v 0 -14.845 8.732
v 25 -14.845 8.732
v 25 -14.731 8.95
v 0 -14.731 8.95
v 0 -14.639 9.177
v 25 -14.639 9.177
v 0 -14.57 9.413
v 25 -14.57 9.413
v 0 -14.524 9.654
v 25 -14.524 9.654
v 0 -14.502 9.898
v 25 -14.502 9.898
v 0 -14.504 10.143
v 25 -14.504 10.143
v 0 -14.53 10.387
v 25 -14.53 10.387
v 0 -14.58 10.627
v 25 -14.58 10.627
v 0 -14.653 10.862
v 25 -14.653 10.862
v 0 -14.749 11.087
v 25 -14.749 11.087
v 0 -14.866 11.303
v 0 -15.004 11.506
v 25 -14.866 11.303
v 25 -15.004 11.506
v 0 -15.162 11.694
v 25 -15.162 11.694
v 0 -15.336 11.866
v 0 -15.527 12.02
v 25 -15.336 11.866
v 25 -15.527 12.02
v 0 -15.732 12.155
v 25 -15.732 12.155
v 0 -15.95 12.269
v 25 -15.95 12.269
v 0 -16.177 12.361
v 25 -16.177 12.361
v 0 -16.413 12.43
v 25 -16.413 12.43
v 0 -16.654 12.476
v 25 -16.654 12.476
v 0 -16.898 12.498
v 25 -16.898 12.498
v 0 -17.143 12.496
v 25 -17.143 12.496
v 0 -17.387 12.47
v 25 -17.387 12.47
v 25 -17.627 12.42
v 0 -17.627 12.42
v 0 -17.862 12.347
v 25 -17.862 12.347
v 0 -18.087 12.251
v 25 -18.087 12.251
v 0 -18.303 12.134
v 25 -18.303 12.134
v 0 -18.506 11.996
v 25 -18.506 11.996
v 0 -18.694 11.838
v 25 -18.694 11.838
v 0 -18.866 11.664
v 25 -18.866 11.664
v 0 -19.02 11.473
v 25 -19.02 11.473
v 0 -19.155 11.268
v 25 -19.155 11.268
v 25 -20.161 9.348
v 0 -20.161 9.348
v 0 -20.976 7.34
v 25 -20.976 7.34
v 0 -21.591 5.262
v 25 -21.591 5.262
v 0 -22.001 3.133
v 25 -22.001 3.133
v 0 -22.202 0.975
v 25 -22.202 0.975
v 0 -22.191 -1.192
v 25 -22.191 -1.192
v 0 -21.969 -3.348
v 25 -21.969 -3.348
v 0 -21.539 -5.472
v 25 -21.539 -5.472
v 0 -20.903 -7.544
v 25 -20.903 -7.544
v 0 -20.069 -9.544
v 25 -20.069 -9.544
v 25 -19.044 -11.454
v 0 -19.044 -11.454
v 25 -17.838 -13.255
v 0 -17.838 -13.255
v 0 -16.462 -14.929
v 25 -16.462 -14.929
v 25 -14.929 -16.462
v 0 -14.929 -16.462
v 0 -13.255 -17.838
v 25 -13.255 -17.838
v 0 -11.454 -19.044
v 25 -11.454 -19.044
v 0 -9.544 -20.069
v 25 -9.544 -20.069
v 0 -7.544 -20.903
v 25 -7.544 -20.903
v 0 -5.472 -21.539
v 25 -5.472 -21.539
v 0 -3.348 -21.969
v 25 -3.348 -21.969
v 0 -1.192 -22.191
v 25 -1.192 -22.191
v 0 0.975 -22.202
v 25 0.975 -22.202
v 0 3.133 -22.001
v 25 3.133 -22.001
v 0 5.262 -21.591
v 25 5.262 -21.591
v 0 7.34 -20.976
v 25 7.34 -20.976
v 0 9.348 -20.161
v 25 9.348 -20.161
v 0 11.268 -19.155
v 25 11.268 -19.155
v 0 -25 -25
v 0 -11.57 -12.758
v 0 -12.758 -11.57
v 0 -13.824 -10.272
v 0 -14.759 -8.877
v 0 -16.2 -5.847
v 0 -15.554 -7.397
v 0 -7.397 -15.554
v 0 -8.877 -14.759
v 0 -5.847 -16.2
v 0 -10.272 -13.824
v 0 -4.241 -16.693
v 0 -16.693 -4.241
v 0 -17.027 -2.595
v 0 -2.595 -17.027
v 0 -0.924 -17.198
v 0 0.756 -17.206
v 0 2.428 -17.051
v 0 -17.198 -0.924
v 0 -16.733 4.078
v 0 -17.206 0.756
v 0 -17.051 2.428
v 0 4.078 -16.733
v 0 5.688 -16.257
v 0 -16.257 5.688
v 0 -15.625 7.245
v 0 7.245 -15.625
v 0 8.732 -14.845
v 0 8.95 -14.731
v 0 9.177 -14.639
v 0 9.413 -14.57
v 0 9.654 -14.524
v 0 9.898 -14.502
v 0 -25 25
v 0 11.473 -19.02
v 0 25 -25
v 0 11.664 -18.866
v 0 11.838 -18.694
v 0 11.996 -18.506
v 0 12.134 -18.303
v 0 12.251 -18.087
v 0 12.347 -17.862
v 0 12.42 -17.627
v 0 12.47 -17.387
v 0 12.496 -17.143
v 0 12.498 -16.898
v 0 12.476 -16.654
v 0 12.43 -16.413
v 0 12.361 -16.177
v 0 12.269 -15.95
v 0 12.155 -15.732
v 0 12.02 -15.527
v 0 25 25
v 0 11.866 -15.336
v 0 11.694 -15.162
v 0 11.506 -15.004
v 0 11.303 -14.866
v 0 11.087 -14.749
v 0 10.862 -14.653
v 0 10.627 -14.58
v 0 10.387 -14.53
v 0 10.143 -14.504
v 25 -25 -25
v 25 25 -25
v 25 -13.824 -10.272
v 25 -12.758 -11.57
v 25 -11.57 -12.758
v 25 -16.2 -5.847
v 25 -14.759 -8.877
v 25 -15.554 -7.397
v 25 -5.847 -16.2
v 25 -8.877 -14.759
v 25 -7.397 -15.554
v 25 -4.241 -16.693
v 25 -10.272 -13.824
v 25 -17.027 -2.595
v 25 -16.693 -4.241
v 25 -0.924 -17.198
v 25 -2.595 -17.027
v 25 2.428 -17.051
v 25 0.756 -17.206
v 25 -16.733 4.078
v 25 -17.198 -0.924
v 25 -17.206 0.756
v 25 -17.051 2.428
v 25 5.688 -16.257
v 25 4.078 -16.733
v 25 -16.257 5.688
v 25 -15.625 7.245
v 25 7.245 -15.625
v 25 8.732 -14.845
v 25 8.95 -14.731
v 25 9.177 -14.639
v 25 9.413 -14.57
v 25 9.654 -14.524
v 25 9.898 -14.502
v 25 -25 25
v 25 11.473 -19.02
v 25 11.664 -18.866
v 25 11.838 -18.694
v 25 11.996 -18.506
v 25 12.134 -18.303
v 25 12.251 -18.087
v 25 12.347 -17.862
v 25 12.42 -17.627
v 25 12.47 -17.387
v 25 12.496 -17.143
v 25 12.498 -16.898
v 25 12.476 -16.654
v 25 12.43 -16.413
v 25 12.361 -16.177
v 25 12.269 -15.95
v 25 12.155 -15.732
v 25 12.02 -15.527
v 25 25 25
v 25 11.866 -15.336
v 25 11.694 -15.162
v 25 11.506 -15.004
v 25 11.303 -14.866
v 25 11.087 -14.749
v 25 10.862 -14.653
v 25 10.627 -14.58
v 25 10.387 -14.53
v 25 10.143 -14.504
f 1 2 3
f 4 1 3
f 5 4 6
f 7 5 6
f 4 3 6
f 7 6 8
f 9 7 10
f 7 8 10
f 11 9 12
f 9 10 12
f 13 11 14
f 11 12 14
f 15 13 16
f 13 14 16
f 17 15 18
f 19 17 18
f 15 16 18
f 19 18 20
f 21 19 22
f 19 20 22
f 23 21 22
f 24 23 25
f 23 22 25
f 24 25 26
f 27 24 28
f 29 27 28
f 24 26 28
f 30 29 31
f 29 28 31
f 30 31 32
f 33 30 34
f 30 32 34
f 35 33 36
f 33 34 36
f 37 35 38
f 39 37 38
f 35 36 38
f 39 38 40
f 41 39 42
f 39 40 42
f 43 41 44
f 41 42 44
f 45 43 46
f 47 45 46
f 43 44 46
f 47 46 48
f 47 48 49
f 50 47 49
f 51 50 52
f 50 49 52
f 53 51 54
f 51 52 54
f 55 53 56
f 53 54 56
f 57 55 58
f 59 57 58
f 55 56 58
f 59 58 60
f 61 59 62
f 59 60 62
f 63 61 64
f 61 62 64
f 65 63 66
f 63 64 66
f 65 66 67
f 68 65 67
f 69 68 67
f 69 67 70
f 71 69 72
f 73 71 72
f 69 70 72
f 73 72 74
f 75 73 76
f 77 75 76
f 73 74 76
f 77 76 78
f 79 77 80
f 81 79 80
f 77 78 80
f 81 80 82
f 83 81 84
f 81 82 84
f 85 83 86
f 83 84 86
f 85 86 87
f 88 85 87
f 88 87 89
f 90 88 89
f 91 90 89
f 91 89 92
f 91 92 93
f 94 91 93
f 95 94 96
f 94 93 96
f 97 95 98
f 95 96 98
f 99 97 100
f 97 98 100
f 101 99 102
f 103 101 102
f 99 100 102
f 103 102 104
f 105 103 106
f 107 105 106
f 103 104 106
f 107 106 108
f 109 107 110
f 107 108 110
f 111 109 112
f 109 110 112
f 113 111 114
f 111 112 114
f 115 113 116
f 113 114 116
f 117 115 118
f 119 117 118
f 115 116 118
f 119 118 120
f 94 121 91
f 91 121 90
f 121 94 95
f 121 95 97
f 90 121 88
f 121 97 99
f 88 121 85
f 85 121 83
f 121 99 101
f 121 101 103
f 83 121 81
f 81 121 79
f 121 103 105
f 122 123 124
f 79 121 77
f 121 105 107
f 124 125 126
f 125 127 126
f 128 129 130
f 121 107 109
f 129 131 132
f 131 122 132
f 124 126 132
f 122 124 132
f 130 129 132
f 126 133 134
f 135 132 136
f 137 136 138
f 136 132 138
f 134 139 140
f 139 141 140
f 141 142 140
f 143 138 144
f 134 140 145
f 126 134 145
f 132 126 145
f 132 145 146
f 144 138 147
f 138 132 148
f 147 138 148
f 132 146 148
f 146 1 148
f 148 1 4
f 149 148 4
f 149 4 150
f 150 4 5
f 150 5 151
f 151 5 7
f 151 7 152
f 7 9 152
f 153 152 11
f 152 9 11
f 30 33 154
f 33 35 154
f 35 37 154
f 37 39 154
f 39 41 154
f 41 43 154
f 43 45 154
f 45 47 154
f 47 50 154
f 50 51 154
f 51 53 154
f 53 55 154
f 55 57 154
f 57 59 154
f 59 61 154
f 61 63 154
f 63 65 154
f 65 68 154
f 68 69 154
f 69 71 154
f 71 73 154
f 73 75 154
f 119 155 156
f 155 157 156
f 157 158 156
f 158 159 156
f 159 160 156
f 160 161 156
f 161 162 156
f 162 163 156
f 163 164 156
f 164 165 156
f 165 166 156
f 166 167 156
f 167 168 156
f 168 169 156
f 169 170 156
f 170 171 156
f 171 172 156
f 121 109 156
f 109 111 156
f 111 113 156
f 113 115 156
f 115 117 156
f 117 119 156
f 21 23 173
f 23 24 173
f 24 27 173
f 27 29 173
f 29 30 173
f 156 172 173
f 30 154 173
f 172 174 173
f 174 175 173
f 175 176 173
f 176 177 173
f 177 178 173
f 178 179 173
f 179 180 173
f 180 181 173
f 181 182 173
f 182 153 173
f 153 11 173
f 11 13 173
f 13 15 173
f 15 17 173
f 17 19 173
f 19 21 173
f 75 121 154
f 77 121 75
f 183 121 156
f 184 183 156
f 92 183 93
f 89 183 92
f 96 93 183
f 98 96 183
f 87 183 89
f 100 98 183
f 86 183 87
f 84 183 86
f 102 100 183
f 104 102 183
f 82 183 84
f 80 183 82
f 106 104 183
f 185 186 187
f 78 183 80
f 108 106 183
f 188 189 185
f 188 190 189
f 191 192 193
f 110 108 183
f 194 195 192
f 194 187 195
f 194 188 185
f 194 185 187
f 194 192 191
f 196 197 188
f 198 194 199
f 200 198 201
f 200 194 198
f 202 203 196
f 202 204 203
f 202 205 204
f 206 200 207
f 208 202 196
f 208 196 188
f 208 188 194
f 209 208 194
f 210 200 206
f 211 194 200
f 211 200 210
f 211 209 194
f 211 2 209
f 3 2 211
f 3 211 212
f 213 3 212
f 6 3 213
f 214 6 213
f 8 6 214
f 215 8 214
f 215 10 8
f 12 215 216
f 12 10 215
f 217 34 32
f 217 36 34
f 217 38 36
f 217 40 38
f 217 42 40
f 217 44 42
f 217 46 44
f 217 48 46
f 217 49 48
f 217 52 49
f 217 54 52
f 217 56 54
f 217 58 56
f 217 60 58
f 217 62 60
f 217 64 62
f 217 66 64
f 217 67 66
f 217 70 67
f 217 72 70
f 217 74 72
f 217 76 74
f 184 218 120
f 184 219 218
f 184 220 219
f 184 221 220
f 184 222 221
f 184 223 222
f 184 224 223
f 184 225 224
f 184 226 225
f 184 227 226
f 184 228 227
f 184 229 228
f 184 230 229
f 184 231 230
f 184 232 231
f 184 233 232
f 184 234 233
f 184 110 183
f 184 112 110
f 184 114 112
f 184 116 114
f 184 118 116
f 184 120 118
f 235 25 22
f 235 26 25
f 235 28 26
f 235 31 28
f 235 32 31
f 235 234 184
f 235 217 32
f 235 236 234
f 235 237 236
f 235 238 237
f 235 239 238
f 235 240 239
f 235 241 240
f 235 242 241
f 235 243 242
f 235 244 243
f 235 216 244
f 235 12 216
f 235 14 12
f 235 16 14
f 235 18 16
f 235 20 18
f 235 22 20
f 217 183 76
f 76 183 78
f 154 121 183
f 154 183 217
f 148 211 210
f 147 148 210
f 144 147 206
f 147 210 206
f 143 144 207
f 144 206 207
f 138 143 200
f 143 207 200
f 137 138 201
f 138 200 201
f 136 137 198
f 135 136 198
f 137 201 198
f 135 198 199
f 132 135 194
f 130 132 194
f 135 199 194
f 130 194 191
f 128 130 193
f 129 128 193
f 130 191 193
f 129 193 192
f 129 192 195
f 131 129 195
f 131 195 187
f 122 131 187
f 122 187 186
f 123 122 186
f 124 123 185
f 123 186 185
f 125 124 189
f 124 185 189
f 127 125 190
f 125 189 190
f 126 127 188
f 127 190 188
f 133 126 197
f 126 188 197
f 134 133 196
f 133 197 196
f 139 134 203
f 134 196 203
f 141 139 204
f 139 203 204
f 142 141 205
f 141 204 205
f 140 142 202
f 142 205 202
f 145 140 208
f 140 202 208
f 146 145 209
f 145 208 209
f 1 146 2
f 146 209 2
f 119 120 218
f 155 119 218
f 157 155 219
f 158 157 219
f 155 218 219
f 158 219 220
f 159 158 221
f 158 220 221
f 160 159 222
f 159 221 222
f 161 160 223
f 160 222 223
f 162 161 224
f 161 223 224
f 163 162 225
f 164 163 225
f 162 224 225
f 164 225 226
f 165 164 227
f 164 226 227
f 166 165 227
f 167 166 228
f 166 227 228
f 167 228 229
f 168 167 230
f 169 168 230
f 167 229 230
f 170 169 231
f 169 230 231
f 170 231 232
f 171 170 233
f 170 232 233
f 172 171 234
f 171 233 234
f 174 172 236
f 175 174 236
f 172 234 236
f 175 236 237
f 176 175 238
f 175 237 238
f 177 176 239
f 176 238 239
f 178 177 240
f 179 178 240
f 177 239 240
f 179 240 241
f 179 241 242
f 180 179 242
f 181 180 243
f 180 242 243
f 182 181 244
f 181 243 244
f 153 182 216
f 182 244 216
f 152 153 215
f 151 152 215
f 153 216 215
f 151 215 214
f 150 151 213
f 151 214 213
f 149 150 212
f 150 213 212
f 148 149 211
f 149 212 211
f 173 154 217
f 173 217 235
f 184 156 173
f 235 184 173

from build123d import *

# Parameters (mm, degrees)
F0_W     = 50
F0_H     = 50
F1_DEPTH = 25
F3_DEPTH = 25


with BuildPart() as f1:
    # F0 (on Right) → F1 (new body)
    with BuildSketch(Plane.YZ):
        Rectangle(F0_W, F0_H)
    extrude(amount=F1_DEPTH)

    # F2 (on face) → F3 (cut)
    with BuildSketch(Plane.YZ.offset(25)):
        with BuildLine():
            ThreePointArc((8.73245, -14.845164), (-12.178559, -12.178559), (-14.845164, 8.73245))
            ThreePointArc((-14.845164, 8.73245), (-15.73245, 12.154836), (-19.154836, 11.26755))
            ThreePointArc((-19.154836, 11.26755), (-15.714093, -15.714093), (11.26755, -19.154836))
            ThreePointArc((11.26755, -19.154836), (12.154836, -15.73245), (8.73245, -14.845164))
        make_face()
    extrude(amount=-F3_DEPTH, mode=Mode.SUBTRACT)


solid = f1.part
